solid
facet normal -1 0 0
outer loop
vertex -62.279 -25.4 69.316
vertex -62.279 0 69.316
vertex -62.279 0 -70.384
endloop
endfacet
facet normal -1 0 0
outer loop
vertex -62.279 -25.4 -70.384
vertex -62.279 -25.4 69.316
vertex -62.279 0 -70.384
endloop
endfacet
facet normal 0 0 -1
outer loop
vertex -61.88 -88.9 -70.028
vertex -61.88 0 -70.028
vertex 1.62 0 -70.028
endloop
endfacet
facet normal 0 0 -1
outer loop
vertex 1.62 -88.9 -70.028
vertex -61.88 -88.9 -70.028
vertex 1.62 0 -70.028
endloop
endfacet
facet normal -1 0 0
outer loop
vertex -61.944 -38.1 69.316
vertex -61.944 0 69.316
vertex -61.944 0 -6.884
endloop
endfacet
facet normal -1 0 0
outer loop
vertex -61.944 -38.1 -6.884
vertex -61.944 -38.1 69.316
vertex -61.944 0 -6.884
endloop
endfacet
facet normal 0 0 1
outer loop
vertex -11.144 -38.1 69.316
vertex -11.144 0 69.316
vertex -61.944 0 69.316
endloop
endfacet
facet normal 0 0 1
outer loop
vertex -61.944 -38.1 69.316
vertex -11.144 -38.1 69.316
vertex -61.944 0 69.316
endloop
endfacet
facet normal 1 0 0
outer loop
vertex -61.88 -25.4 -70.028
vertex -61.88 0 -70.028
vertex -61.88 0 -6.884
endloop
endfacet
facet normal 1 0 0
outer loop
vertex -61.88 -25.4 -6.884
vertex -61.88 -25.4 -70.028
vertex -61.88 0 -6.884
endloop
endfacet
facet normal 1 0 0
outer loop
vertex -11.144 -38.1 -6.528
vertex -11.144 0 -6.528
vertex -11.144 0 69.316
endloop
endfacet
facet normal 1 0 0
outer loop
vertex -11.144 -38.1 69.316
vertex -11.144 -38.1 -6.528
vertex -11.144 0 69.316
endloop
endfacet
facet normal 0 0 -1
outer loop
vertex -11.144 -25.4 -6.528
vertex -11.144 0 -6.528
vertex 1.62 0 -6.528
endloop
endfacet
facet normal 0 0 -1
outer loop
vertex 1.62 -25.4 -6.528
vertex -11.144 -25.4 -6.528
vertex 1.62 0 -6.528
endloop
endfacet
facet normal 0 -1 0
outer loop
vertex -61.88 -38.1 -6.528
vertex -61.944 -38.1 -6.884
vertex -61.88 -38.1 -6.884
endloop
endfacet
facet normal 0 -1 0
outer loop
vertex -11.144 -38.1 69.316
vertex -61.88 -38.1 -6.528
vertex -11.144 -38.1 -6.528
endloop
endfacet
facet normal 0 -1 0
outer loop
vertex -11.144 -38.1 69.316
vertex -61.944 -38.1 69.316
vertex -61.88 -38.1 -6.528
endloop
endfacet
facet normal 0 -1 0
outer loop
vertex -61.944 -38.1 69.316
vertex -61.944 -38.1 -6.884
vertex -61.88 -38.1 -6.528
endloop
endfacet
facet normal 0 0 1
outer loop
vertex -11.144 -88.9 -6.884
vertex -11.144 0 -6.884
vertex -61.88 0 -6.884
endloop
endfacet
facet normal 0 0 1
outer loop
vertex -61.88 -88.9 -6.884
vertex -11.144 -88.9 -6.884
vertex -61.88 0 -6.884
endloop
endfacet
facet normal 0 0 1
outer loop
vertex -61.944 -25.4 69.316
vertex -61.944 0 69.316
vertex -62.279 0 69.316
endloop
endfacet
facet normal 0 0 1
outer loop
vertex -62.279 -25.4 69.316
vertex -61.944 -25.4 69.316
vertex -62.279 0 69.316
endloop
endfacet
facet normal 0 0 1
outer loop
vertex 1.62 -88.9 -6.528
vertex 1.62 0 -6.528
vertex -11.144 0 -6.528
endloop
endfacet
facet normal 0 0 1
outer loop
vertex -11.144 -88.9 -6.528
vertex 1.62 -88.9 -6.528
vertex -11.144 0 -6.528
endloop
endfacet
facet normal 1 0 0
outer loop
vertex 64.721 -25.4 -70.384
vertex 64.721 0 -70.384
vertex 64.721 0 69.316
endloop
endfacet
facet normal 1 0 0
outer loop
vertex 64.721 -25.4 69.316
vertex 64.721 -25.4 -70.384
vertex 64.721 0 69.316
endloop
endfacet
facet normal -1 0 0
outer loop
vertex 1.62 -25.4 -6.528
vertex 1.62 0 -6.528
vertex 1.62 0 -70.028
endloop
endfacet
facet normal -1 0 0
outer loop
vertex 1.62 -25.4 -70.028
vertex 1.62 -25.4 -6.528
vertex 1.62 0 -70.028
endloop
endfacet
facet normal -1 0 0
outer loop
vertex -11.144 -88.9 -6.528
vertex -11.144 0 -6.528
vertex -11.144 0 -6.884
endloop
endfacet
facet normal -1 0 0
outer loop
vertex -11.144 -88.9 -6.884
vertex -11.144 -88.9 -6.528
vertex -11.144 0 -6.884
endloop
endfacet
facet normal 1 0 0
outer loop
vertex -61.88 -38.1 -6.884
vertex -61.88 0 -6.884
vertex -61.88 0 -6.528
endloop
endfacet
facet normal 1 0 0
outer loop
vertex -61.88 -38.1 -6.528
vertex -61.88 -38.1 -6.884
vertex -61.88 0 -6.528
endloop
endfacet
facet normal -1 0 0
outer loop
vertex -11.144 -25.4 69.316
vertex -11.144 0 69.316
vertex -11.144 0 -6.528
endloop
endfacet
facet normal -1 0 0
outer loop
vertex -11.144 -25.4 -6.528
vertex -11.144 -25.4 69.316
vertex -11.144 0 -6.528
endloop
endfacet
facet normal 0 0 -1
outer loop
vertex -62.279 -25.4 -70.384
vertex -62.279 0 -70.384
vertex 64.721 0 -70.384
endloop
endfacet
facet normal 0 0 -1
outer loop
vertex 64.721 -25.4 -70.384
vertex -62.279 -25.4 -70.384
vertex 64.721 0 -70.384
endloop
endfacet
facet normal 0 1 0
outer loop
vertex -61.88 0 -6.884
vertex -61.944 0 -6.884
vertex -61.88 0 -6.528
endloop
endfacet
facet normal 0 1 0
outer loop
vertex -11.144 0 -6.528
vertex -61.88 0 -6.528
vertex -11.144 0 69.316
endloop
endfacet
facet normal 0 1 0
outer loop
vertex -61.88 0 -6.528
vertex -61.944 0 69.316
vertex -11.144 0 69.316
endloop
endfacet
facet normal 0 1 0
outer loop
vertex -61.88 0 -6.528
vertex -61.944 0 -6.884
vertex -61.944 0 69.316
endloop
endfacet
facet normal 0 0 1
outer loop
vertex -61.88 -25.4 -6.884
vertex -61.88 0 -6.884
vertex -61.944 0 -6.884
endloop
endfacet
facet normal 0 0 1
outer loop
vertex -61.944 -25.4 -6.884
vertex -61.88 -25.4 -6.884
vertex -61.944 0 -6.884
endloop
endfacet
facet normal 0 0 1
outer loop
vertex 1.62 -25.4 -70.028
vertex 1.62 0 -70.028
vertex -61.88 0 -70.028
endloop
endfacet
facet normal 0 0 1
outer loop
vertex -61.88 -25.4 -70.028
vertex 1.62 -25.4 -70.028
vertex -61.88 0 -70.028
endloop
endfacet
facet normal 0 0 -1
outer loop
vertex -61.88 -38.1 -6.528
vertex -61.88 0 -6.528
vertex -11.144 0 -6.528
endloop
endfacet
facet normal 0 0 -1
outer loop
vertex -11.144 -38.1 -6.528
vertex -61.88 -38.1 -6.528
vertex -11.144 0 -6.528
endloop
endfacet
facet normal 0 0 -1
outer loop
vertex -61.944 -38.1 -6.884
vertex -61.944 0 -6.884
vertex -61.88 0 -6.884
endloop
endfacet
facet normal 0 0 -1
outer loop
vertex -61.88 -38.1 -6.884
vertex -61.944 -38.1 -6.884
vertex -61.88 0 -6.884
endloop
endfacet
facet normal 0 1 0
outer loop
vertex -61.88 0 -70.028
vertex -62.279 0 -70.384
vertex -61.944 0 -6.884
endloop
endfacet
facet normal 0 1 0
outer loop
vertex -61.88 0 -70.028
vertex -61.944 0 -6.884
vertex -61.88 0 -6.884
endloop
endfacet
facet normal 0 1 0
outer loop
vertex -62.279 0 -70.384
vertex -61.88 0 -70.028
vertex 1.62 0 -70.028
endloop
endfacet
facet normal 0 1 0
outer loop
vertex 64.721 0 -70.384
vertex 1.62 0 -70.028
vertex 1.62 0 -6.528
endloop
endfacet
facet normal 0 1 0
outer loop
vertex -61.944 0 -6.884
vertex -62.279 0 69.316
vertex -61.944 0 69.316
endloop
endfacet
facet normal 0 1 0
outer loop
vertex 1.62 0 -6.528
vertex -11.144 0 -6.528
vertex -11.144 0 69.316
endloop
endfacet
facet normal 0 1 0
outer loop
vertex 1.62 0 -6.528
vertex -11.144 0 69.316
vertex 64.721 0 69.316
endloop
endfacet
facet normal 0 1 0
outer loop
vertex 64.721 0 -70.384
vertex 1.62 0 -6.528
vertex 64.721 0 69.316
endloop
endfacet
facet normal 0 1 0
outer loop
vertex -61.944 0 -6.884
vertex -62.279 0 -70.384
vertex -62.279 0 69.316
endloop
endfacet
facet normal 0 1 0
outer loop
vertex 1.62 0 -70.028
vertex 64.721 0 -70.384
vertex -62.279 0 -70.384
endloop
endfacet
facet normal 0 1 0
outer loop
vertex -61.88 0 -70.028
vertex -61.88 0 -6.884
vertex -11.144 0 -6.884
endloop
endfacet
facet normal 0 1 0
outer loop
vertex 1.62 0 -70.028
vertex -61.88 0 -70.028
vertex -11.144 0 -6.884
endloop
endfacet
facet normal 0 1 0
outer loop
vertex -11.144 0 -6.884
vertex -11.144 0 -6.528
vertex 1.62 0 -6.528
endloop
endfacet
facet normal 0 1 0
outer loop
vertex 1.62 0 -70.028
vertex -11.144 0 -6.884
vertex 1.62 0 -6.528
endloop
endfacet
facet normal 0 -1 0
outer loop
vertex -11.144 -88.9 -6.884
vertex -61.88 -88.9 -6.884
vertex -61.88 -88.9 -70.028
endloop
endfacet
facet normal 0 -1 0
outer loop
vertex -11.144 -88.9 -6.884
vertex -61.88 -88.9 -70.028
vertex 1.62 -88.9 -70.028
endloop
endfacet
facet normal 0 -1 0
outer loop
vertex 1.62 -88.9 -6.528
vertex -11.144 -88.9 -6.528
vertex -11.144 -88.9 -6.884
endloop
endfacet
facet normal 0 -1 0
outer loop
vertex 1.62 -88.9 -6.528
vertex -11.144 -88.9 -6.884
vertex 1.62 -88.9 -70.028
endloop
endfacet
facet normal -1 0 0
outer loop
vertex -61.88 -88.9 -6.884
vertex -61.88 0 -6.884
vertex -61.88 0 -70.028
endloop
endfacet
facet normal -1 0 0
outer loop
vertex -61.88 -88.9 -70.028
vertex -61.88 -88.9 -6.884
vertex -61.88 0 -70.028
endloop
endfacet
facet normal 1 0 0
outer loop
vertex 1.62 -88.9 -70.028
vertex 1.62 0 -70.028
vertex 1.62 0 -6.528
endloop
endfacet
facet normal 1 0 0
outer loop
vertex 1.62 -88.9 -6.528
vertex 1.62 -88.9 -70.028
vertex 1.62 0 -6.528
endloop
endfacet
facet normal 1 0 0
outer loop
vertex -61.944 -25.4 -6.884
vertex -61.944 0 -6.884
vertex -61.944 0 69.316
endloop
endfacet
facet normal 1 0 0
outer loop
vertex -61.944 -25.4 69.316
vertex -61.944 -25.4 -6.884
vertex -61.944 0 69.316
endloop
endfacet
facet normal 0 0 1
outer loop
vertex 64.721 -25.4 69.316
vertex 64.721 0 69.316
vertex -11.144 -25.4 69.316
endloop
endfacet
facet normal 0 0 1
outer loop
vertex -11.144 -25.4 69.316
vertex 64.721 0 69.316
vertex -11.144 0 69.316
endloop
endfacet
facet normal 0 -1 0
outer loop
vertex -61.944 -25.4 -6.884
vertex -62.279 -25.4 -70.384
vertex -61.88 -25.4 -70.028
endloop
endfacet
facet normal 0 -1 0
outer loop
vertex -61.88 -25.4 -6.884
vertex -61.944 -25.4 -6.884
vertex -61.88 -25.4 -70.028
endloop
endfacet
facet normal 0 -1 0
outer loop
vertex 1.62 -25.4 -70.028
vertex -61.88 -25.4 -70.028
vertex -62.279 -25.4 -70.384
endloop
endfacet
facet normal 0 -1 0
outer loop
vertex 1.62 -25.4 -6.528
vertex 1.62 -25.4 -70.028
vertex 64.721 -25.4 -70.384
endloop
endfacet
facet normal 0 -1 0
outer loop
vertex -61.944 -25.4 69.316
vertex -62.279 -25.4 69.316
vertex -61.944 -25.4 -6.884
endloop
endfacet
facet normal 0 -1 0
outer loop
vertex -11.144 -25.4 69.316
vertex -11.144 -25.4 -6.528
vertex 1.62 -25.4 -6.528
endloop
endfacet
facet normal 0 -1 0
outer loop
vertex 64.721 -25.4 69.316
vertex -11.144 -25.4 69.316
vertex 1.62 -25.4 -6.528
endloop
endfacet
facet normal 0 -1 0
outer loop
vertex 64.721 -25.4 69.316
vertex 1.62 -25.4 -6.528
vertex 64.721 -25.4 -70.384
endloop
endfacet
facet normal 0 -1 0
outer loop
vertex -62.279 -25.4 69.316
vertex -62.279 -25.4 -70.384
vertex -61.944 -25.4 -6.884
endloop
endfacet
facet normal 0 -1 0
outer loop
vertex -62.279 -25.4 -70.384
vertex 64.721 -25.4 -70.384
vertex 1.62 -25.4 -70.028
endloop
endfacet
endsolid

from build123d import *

# Parameters (mm, degrees)
F1_DEPTH = 88.9
F2_DEPTH = 38.1
F3_DEPTH = 25.4


with BuildPart() as f1:
    # F0 (on Front) → F1 (new body)
    with BuildSketch(Plane.XZ):
        Polygon((1.619642, -6.527692), (-11.143893, -6.527692), (-11.143893, -6.883733), (-61.880358, -6.883733), (-61.880358, -70.027692), (1.619642, -70.027692), align=None)
    extrude(amount=F1_DEPTH)


with BuildPart() as f2:
    # F0 (on Front) → F2 (new body)
    with BuildSketch(Plane.XZ):
        Polygon((-61.880358, -6.883733), (-61.880358, -6.527692), (-11.143893, -6.527692), (-11.143893, 69.316112), (-61.943893, 69.316112), (-61.943893, -6.883733), align=None)
    extrude(amount=F2_DEPTH)


with BuildPart() as f3:
    # F0 (on Front) → F3 (new body)
    with BuildSketch(Plane.XZ):
        Polygon((-11.143893, 69.316112), (-11.143893, -6.527692), (1.619642, -6.527692), (1.619642, -70.027692), (-61.880358, -70.027692), (-61.880358, -6.883733), (-61.943893, -6.883733), (-61.943893, 69.316112), (-62.278867, 69.316112), (-62.278867, -70.383888), (64.721133, -70.383888), (64.721133, 69.316112), align=None)
    extrude(amount=F3_DEPTH)


solid = Compound([f1.part, f2.part, f3.part])
